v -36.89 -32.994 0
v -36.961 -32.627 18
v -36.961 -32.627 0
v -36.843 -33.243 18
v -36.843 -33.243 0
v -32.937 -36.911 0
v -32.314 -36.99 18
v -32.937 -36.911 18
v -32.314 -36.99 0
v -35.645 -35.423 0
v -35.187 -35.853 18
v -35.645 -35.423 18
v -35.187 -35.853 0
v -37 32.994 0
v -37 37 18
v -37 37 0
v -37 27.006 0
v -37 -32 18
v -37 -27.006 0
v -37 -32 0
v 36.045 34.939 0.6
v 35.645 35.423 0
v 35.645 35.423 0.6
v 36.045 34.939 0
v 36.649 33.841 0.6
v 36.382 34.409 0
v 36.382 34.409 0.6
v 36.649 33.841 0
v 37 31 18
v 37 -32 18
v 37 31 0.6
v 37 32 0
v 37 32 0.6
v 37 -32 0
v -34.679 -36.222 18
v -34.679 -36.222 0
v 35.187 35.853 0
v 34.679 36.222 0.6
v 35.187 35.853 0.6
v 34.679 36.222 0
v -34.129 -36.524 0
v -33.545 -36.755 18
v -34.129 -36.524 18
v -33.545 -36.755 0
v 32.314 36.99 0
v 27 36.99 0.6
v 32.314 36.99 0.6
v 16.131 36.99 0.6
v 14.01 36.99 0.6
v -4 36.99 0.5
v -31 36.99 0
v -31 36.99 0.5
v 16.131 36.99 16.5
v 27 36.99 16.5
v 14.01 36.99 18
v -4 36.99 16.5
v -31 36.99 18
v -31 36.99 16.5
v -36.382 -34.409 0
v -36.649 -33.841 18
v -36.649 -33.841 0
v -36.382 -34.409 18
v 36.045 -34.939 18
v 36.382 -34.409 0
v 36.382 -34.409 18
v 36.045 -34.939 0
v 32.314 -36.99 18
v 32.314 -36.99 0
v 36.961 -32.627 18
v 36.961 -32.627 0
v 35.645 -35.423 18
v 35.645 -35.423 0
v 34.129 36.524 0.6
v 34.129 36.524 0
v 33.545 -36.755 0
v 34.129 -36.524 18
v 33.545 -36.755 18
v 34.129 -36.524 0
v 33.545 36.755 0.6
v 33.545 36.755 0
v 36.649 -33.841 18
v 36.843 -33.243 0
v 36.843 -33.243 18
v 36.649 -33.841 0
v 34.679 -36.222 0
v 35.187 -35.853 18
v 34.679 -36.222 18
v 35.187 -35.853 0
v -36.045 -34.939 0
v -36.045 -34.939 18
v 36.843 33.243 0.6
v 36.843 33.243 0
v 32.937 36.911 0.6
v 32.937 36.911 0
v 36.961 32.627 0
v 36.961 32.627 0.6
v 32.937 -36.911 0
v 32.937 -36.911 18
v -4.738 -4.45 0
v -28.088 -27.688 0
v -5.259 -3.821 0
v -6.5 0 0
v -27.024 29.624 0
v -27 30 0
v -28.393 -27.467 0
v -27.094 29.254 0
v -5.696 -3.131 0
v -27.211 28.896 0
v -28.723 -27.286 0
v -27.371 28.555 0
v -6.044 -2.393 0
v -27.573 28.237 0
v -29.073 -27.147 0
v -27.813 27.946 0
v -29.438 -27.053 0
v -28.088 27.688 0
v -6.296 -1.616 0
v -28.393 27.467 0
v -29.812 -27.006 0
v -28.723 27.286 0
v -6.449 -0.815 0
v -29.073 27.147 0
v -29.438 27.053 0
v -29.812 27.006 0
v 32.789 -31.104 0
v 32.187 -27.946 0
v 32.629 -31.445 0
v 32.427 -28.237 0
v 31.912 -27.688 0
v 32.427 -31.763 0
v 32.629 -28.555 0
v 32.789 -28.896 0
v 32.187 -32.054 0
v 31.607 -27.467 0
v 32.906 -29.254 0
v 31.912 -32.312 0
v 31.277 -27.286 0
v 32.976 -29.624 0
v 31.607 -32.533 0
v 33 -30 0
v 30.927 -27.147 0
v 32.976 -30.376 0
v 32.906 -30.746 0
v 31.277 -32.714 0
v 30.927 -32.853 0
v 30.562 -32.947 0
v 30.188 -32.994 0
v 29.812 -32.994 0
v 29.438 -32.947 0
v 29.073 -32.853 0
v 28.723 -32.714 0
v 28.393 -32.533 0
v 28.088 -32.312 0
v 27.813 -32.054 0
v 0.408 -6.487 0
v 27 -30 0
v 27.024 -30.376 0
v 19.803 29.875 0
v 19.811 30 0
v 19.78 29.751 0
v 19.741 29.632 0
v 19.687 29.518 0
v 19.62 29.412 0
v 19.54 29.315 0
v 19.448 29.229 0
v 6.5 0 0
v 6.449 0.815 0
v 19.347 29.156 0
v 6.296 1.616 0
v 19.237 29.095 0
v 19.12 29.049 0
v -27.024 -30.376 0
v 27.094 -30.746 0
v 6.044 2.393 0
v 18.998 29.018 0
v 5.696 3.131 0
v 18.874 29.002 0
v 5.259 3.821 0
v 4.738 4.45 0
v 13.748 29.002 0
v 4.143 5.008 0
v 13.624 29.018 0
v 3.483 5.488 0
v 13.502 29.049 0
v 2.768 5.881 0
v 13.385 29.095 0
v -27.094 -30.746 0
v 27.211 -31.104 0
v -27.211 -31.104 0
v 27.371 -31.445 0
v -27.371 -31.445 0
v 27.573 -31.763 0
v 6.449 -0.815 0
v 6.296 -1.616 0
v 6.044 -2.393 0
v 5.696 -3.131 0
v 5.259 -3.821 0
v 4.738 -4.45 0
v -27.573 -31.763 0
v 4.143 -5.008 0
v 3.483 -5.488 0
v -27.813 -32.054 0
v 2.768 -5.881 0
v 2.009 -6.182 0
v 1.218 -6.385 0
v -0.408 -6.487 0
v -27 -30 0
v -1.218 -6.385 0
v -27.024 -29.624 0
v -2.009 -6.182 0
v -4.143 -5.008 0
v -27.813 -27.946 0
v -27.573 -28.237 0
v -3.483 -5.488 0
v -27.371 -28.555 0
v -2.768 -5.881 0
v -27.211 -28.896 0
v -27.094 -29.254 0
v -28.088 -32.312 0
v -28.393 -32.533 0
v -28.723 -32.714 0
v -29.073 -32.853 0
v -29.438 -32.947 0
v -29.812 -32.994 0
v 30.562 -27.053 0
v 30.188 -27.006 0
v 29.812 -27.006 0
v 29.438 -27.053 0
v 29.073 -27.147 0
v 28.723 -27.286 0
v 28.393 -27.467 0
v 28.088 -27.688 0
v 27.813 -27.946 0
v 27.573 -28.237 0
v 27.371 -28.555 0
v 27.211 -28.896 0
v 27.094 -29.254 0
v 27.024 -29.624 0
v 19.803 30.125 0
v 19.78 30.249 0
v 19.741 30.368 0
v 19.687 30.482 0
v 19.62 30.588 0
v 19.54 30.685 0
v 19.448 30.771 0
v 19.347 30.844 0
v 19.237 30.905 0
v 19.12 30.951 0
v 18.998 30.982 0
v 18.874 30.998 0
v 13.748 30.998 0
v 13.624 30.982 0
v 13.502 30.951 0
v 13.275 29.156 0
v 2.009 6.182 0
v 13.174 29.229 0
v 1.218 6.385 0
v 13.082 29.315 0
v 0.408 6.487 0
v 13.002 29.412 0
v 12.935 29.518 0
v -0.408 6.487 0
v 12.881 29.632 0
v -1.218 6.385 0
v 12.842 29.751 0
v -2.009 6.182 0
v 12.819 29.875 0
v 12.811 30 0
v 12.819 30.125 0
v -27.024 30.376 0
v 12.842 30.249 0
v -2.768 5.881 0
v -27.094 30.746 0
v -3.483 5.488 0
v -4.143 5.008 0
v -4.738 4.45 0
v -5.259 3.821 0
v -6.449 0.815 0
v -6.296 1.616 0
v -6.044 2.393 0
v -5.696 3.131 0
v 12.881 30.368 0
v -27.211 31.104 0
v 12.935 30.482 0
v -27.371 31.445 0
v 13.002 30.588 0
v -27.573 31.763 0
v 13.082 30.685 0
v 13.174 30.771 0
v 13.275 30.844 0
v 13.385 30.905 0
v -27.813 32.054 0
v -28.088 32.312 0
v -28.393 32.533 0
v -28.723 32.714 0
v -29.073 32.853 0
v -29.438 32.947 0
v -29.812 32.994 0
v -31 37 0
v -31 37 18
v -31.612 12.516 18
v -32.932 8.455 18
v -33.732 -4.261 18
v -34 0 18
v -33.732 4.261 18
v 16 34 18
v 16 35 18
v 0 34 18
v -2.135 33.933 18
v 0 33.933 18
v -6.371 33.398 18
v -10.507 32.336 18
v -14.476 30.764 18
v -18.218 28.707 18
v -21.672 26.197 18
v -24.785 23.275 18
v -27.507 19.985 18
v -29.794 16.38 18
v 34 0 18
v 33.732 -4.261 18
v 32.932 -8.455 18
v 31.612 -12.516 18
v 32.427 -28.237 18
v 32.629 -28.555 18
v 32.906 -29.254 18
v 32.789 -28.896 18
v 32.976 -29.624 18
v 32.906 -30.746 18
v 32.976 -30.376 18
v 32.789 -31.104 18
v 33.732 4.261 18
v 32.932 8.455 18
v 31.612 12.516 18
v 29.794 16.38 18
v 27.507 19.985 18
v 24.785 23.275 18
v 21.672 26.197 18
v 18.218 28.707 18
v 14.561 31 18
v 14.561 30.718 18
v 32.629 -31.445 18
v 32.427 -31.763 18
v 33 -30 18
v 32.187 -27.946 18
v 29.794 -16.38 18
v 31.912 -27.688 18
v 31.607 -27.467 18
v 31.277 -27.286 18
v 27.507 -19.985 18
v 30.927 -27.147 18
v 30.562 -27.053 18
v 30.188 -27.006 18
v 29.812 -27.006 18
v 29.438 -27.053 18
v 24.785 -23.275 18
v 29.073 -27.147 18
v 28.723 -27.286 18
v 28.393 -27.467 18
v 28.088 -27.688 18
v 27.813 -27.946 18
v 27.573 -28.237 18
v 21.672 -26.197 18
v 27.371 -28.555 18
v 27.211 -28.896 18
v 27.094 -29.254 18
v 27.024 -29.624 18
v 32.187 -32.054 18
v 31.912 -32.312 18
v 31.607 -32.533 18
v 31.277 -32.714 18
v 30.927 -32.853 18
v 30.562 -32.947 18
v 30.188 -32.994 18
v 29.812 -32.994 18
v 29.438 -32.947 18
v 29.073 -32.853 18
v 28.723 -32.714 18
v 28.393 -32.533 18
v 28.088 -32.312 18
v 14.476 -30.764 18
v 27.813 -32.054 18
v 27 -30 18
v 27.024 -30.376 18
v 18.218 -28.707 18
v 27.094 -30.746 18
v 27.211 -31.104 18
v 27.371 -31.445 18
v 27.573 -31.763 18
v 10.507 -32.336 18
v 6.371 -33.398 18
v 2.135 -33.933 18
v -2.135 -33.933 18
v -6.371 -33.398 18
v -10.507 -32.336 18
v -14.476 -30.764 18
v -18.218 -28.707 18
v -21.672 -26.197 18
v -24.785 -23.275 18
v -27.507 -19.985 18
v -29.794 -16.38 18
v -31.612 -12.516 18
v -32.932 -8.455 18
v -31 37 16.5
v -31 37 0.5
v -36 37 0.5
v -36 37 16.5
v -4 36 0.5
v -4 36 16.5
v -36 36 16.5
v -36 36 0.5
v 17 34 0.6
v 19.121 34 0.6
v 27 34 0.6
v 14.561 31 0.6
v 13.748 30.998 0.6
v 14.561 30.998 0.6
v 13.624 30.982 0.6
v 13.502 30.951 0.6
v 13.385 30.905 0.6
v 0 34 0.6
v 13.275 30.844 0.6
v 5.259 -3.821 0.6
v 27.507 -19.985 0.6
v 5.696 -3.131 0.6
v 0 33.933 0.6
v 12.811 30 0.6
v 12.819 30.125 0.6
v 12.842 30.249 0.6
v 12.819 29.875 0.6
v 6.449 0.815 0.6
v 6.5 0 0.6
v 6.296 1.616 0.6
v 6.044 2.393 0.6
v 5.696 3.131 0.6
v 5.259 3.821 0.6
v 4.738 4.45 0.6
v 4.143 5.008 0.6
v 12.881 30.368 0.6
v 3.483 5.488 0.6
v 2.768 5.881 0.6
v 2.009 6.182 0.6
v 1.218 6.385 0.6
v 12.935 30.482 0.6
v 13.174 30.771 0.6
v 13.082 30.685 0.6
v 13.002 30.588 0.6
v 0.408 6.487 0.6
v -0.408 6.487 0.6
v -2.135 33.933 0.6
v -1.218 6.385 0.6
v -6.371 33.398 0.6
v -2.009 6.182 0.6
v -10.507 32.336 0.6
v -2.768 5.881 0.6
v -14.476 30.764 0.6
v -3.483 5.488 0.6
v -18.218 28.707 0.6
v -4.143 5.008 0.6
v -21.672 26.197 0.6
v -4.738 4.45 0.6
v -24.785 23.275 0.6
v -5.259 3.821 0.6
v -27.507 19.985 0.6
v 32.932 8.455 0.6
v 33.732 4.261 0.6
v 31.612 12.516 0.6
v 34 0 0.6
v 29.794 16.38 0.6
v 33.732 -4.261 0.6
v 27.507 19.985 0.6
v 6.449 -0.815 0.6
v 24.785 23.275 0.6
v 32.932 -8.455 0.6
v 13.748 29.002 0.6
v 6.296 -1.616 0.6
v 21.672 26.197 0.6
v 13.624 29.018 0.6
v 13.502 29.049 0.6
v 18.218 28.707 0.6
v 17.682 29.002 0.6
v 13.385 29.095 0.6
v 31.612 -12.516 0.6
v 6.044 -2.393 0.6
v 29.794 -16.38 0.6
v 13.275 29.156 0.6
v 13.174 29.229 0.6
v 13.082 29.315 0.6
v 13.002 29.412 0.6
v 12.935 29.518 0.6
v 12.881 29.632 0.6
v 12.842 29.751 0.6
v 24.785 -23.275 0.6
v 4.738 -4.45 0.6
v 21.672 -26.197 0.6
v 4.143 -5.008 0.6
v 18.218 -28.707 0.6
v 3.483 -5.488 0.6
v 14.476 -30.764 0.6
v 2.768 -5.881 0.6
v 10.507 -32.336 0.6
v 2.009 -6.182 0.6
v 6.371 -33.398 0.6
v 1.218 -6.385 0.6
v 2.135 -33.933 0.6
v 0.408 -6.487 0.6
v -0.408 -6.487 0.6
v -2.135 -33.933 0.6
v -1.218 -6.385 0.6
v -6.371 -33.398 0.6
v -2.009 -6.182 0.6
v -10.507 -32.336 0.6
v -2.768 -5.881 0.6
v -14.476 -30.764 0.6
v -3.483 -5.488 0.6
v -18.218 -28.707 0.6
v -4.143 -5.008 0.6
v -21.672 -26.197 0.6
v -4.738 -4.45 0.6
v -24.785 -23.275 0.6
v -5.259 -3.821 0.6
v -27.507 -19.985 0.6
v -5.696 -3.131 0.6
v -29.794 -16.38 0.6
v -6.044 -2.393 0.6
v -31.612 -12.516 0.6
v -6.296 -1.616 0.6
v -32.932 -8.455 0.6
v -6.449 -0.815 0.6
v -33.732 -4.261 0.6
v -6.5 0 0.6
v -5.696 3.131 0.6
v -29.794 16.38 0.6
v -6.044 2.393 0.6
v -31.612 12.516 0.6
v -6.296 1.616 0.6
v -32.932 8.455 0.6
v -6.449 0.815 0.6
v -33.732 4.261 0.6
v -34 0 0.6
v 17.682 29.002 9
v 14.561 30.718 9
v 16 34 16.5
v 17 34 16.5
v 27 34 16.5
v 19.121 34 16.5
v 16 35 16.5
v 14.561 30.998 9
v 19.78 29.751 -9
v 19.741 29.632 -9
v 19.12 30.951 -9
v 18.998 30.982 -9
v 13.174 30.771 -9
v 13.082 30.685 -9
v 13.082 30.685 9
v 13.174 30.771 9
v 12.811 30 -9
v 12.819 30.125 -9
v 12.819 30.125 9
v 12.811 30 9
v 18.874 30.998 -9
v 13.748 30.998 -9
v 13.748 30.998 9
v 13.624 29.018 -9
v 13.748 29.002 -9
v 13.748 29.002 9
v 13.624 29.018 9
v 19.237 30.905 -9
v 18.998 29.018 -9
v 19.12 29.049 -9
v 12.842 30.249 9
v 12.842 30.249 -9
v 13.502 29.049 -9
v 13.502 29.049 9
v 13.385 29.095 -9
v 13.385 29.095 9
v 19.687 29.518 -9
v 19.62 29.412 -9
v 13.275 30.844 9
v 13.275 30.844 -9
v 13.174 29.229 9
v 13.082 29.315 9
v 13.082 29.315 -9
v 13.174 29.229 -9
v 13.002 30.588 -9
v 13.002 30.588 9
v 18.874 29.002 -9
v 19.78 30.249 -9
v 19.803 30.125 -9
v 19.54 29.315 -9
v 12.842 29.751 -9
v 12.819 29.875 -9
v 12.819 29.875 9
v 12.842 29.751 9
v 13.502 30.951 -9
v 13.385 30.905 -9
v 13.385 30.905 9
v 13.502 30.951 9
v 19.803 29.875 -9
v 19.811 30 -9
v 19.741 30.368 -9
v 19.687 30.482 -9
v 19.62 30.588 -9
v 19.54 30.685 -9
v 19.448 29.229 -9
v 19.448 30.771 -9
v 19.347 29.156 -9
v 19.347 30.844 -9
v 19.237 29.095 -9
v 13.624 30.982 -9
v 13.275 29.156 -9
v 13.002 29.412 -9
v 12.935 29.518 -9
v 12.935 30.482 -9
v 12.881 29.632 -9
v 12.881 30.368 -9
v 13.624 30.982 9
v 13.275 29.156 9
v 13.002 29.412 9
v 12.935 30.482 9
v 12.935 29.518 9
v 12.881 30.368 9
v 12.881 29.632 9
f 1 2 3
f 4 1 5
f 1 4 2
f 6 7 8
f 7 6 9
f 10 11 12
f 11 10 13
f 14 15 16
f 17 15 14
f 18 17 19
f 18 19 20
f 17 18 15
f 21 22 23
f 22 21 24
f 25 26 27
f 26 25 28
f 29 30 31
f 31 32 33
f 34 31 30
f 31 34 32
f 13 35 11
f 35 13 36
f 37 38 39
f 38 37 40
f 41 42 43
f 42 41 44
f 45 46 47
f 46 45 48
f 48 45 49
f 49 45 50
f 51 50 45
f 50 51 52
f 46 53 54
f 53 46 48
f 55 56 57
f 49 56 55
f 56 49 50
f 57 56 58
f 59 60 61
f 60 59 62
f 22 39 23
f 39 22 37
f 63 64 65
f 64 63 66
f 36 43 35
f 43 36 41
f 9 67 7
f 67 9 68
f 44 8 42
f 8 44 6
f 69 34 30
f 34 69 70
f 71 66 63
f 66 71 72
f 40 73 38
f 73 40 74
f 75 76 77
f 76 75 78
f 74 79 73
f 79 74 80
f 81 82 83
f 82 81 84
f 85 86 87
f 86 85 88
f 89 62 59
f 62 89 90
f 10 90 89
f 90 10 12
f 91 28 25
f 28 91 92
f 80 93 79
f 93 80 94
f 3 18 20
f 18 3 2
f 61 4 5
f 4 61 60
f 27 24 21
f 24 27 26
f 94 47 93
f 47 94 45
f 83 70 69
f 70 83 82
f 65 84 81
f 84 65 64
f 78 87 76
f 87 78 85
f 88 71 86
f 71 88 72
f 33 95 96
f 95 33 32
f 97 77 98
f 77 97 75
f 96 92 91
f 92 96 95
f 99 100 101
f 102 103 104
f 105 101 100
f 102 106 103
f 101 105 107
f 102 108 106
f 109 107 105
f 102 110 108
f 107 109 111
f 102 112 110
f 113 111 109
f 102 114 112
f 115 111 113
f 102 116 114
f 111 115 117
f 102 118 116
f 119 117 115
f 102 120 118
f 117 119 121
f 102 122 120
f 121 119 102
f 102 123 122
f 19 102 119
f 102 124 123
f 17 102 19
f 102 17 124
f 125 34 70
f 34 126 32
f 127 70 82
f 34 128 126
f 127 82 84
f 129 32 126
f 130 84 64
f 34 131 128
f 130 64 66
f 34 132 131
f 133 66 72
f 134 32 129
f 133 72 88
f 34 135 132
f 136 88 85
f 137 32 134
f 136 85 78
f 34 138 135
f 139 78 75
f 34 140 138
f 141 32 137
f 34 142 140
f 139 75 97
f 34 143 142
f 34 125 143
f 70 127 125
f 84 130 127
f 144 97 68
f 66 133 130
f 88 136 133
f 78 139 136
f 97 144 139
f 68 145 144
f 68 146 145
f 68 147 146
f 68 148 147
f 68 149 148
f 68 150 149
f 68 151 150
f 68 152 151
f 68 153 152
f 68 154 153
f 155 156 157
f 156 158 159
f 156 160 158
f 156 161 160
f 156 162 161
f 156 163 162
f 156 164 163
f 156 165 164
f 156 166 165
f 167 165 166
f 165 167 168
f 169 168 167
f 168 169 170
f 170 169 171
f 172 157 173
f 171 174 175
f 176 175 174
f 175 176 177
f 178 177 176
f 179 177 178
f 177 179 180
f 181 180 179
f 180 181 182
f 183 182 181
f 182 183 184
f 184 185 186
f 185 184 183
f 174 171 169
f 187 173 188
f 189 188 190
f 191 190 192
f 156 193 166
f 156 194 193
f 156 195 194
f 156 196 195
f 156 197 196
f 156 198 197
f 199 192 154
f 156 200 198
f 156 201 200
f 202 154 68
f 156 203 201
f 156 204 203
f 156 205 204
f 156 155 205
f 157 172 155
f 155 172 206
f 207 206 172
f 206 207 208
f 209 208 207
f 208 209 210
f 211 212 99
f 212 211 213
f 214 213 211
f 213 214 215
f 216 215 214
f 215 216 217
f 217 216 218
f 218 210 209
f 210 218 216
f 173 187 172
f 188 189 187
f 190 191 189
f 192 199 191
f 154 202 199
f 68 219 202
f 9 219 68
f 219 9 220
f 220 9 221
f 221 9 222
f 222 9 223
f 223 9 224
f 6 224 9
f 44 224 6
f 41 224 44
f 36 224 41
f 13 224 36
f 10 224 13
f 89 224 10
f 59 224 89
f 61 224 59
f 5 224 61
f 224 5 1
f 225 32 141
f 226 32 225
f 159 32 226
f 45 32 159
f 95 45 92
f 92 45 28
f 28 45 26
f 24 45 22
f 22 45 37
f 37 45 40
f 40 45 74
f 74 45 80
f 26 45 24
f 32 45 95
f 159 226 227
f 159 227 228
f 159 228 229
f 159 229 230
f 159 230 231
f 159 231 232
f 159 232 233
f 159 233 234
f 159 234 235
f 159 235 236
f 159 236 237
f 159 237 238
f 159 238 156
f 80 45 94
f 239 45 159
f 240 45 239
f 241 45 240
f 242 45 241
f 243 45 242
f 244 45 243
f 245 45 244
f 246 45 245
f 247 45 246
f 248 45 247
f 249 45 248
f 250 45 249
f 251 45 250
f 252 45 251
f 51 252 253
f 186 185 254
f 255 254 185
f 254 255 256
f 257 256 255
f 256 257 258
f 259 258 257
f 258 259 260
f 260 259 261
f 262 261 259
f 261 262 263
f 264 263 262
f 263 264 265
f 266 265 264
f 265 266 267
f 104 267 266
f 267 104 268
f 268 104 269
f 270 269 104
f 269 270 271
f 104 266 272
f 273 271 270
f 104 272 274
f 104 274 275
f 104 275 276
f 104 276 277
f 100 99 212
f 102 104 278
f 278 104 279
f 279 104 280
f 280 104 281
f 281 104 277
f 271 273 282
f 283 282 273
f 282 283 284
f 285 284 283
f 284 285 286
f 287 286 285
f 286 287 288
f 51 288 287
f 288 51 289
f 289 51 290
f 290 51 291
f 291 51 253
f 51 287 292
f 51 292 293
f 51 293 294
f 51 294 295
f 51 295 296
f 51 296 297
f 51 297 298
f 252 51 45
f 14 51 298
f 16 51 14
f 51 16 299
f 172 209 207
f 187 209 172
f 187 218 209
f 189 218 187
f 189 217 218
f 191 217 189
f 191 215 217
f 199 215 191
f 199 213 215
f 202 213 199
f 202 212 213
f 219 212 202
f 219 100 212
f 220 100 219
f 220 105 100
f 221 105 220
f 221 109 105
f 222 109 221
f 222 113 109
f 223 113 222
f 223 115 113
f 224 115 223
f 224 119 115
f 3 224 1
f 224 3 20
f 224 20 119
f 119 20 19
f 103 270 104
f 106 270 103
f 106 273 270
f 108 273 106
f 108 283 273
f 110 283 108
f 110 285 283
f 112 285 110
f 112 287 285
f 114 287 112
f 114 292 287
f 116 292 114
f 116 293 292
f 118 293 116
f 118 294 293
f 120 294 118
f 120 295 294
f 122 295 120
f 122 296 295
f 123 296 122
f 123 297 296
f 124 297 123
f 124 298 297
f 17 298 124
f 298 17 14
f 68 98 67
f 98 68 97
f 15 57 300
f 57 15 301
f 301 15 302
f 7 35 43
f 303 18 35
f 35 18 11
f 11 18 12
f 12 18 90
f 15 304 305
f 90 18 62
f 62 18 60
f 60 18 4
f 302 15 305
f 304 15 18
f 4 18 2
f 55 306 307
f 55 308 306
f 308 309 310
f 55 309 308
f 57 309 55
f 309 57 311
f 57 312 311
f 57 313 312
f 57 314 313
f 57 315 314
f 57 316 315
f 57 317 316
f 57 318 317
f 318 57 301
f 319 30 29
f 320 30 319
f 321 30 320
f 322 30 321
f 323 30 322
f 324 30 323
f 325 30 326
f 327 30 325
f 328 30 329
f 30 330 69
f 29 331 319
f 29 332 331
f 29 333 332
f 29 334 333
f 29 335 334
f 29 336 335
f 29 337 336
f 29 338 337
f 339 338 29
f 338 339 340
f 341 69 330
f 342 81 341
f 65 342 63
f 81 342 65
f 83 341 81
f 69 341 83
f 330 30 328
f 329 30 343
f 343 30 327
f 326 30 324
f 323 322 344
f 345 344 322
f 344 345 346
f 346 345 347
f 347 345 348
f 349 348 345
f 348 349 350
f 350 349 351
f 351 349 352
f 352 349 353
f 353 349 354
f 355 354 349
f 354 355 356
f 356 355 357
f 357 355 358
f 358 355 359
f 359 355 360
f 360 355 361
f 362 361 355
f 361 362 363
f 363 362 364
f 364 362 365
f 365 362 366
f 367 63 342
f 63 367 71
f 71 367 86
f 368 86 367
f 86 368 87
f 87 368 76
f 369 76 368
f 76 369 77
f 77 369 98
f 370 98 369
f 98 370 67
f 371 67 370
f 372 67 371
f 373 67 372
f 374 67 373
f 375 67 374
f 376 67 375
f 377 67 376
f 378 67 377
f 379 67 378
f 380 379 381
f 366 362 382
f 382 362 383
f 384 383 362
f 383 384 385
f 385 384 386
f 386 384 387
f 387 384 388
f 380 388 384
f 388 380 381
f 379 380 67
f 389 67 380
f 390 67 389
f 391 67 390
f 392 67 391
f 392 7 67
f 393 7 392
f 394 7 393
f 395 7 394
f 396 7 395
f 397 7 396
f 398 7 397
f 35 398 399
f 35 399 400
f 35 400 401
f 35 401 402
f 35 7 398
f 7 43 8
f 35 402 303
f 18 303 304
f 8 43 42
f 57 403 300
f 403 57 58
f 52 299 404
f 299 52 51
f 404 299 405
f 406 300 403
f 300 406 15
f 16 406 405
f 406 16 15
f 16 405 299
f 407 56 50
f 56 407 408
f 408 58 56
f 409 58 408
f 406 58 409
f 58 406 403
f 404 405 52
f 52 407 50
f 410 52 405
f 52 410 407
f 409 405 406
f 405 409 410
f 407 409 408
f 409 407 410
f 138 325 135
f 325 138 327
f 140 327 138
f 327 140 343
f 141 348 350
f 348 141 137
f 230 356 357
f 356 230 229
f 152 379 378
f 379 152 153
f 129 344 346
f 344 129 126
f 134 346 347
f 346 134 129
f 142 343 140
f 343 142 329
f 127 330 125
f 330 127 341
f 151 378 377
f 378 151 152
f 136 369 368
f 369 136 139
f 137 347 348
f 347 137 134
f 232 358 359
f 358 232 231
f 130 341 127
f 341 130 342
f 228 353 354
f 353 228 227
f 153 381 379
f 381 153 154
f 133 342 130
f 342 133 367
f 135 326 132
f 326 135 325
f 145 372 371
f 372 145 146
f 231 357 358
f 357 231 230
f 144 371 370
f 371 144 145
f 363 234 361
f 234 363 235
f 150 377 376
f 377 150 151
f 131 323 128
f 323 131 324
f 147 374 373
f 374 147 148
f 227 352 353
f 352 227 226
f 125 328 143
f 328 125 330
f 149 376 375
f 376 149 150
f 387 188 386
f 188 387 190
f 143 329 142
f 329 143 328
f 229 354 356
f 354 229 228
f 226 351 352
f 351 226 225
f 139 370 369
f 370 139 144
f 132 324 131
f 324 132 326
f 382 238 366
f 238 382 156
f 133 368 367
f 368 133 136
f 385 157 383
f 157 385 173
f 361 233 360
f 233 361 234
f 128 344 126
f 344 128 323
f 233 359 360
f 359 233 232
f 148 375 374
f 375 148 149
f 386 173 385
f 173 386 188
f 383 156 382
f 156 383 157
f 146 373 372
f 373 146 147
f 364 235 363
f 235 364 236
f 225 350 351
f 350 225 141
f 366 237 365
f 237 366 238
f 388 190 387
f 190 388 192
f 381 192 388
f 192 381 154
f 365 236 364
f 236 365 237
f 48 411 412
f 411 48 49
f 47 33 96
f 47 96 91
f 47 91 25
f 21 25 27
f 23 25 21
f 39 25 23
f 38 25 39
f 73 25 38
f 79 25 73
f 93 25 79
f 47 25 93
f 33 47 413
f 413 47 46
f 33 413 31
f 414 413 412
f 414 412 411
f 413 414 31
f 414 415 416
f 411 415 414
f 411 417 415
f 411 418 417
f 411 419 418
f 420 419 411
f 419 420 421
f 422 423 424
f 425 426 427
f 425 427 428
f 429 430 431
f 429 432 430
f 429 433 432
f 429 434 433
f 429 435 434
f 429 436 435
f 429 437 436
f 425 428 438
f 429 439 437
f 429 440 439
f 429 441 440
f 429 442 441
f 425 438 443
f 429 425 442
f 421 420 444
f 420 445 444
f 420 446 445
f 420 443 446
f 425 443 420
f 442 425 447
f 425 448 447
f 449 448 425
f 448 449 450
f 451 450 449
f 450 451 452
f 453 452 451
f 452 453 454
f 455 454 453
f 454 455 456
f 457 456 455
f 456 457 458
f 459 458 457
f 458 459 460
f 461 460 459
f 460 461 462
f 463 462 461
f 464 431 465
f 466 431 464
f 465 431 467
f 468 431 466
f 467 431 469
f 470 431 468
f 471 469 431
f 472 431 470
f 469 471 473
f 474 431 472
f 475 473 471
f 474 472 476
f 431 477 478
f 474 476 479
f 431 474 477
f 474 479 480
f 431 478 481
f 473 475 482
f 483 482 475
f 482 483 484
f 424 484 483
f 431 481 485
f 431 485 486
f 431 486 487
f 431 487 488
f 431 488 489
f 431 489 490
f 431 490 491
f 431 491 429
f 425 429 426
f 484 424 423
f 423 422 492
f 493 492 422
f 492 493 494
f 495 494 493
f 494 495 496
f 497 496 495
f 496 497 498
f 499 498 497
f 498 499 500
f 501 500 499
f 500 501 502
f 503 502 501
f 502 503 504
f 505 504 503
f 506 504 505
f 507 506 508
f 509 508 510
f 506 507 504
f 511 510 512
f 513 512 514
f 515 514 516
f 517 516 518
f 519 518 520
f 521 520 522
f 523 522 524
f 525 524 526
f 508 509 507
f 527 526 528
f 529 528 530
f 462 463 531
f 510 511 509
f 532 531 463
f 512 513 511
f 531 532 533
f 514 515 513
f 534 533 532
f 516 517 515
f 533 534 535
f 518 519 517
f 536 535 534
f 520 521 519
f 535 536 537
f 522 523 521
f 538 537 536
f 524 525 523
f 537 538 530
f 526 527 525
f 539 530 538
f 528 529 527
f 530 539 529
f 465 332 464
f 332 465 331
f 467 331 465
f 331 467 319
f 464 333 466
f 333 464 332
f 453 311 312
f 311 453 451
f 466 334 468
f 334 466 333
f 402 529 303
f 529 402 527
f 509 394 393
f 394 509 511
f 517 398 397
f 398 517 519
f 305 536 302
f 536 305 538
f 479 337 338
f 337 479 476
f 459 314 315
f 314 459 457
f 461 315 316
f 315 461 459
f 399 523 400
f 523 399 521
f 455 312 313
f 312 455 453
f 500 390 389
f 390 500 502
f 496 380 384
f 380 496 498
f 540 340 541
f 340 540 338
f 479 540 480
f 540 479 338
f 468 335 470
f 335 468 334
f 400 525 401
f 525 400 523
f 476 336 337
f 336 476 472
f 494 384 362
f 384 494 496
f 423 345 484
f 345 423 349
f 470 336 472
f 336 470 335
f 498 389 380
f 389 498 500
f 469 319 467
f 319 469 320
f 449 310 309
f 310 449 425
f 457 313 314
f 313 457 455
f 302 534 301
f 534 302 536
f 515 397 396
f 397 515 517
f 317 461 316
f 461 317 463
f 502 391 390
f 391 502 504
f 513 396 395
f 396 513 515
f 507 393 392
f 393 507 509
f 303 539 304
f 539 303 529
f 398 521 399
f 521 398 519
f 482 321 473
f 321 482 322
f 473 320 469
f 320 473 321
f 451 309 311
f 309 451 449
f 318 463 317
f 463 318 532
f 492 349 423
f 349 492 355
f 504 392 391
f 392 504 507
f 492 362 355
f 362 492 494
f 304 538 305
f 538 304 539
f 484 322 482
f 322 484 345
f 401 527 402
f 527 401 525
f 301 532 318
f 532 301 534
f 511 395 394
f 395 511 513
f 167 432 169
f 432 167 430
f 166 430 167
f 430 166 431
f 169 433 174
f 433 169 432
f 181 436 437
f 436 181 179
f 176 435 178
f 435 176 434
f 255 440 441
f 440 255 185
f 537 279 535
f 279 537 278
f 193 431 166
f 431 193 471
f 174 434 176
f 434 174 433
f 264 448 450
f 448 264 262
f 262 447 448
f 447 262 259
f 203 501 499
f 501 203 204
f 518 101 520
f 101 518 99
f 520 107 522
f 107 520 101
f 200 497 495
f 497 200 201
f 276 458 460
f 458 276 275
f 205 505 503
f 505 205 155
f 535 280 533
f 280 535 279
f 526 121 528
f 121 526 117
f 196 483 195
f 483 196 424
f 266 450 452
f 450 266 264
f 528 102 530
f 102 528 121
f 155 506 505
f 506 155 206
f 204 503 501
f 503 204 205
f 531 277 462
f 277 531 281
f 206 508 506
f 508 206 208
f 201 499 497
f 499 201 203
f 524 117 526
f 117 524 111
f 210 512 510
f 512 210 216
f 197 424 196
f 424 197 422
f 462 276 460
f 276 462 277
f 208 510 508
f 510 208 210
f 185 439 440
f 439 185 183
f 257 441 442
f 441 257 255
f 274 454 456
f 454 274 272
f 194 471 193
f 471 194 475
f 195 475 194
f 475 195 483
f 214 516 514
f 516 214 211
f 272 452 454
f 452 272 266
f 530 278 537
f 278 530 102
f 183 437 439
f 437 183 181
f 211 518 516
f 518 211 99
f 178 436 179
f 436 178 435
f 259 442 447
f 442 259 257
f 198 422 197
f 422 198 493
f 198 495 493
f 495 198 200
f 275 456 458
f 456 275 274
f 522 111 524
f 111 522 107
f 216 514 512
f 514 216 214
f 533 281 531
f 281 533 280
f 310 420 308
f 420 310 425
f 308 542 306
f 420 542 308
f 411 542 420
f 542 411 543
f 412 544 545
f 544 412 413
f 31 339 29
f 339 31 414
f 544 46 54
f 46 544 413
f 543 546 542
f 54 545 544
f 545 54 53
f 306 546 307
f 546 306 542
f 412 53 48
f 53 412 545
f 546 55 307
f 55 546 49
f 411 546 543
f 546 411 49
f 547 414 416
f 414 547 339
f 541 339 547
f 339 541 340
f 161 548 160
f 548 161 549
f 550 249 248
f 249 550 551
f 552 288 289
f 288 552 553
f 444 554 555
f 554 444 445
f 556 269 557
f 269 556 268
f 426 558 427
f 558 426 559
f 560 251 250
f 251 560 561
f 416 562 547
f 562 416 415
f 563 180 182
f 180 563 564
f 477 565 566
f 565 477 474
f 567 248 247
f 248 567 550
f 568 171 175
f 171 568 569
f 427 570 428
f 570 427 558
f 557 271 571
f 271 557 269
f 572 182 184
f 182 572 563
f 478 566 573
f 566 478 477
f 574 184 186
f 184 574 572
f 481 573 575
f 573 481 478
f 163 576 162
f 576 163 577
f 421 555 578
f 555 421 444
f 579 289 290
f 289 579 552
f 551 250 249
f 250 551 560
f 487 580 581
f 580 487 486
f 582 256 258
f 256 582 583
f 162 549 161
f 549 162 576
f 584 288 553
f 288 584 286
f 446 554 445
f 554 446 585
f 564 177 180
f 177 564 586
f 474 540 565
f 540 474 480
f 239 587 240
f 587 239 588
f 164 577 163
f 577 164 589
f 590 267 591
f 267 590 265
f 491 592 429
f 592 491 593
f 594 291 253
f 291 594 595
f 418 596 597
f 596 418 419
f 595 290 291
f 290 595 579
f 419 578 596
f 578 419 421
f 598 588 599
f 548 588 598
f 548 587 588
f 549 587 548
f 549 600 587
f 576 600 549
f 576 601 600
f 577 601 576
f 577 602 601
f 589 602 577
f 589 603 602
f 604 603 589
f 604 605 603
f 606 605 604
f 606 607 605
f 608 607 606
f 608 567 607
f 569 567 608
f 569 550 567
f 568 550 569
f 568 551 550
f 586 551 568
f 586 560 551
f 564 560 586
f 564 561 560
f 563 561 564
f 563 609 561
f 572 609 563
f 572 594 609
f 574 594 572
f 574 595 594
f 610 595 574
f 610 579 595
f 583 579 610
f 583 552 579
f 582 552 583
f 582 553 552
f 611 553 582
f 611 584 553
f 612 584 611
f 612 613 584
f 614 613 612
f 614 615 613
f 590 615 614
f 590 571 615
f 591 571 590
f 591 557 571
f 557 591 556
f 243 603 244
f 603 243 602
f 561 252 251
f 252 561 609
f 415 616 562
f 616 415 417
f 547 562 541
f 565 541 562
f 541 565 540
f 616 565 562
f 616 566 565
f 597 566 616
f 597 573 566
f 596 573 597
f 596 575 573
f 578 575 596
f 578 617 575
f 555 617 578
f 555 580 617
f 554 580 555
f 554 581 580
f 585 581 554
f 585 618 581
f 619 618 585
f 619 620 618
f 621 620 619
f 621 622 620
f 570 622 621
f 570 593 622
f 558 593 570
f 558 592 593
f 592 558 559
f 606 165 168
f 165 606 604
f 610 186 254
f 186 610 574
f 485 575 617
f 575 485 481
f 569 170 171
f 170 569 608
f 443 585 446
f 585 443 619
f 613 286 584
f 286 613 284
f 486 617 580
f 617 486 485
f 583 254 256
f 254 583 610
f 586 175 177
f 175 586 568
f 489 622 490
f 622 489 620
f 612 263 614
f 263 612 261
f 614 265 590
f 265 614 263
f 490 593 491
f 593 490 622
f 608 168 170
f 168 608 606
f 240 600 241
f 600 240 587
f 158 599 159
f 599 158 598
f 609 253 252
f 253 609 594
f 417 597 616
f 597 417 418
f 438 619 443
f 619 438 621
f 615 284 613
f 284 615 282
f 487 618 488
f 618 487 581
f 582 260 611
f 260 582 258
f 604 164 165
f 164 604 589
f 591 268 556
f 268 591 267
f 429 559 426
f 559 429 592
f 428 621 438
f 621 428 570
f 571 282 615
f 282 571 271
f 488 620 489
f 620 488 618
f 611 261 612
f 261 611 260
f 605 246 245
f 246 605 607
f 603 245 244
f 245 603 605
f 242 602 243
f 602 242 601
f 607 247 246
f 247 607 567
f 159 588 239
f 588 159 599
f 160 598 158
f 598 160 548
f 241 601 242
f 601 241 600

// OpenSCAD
$fn = 50;


union() {
	difference() {
		union() {
			hull() {
				translate(v = [-32.0000000000, 32.0000000000, 0]) {
					cylinder(h = 18, r = 5);
				}
				translate(v = [32.0000000000, 32.0000000000, 0]) {
					cylinder(h = 18, r = 5);
				}
				translate(v = [-32.0000000000, -32.0000000000, 0]) {
					cylinder(h = 18, r = 5);
				}
				translate(v = [32.0000000000, -32.0000000000, 0]) {
					cylinder(h = 18, r = 5);
				}
			}
			translate(v = [-37.0000000000, 31.0000000000, 0]) {
				cube(size = [6, 6, 18]);
			}
		}
		union() {
			translate(v = [-37.5000000000, -30.0000000000, -250.0000000000]) {
				rotate(a = [0, 0, 0]) {
					difference() {
						union() {
							hull() {
								translate(v = [7.5000000000, 0, 0]) {
									cylinder(h = 250, r = 3.0000000000, r1 = 3.0000000000, r2 = 3.0000000000);
								}
								translate(v = [-7.5000000000, 0, 0]) {
									cylinder(h = 250, r = 3.0000000000, r1 = 3.0000000000, r2 = 3.0000000000);
								}
							}
						}
						union();
					}
				}
			}
			translate(v = [-37.5000000000, 30.0000000000, -250.0000000000]) {
				rotate(a = [0, 0, 0]) {
					difference() {
						union() {
							hull() {
								translate(v = [7.5000000000, 0, 0]) {
									cylinder(h = 250, r = 3.0000000000, r1 = 3.0000000000, r2 = 3.0000000000);
								}
								translate(v = [-7.5000000000, 0, 0]) {
									cylinder(h = 250, r = 3.0000000000, r1 = 3.0000000000, r2 = 3.0000000000);
								}
							}
						}
						union();
					}
				}
			}
			translate(v = [-36.0000000000, 36.0000000000, 0.5000000000]) {
				cube(size = [32, 1, 16]);
			}
			translate(v = [30.0000000000, -30.0000000000, 0]) {
				cylinder(h = 100, r = 3.0000000000);
			}
			translate(v = [0, 0, 0.6000000000]) {
				cylinder(h = 20.4000000000, r = 34.0000000000);
			}
			translate(v = [0, 0, -9.0000000000]) {
				cylinder(h = 18, r = 6.5000000000);
			}
			translate(v = [0.0000000000, 31.0000000000, 0.6000000000]) {
				cube(size = [37.0000000000, 3, 20.4000000000]);
			}
			translate(v = [27.0000000000, 31.0000000000, 0.6000000000]) {
				cube(size = [10, 6, 20.4000000000]);
			}
			translate(v = [16.0000000000, 31.0000000000, 16.5000000000]) {
				cube(size = [21, 6, 1.5000000000]);
			}
			translate(v = [13.2500000000, 37.7500000000, 0.6000000000]) {
				rotate(a = [0, 0, -45]) {
					cube(size = [7.5000000000, 1.5000000000, 20.4000000000]);
				}
			}
			translate(v = [7.0610000000, 29.0000000000, 0.6000000000]) {
				cube(size = [7.5000000000, 2, 17.4000000000]);
			}
		}
	}
	union() {
		translate(v = [16.3110000000, 30.0000000000, -9.0000000000]) {
			rotate(a = [0, 0, 0]) {
				difference() {
					union() {
						#hull() {
							#translate(v = [2.5000000000, 0, 0]) {
								cylinder(h = 18, r = 1.0000000000, r1 = 1.0000000000, r2 = 1.0000000000);
							}
							#translate(v = [-2.5000000000, 0, 0]) {
								cylinder(h = 18, r = 1.0000000000, r1 = 1.0000000000, r2 = 1.0000000000);
							}
						}
					}
					union();
				}
			}
		}
	}
}
